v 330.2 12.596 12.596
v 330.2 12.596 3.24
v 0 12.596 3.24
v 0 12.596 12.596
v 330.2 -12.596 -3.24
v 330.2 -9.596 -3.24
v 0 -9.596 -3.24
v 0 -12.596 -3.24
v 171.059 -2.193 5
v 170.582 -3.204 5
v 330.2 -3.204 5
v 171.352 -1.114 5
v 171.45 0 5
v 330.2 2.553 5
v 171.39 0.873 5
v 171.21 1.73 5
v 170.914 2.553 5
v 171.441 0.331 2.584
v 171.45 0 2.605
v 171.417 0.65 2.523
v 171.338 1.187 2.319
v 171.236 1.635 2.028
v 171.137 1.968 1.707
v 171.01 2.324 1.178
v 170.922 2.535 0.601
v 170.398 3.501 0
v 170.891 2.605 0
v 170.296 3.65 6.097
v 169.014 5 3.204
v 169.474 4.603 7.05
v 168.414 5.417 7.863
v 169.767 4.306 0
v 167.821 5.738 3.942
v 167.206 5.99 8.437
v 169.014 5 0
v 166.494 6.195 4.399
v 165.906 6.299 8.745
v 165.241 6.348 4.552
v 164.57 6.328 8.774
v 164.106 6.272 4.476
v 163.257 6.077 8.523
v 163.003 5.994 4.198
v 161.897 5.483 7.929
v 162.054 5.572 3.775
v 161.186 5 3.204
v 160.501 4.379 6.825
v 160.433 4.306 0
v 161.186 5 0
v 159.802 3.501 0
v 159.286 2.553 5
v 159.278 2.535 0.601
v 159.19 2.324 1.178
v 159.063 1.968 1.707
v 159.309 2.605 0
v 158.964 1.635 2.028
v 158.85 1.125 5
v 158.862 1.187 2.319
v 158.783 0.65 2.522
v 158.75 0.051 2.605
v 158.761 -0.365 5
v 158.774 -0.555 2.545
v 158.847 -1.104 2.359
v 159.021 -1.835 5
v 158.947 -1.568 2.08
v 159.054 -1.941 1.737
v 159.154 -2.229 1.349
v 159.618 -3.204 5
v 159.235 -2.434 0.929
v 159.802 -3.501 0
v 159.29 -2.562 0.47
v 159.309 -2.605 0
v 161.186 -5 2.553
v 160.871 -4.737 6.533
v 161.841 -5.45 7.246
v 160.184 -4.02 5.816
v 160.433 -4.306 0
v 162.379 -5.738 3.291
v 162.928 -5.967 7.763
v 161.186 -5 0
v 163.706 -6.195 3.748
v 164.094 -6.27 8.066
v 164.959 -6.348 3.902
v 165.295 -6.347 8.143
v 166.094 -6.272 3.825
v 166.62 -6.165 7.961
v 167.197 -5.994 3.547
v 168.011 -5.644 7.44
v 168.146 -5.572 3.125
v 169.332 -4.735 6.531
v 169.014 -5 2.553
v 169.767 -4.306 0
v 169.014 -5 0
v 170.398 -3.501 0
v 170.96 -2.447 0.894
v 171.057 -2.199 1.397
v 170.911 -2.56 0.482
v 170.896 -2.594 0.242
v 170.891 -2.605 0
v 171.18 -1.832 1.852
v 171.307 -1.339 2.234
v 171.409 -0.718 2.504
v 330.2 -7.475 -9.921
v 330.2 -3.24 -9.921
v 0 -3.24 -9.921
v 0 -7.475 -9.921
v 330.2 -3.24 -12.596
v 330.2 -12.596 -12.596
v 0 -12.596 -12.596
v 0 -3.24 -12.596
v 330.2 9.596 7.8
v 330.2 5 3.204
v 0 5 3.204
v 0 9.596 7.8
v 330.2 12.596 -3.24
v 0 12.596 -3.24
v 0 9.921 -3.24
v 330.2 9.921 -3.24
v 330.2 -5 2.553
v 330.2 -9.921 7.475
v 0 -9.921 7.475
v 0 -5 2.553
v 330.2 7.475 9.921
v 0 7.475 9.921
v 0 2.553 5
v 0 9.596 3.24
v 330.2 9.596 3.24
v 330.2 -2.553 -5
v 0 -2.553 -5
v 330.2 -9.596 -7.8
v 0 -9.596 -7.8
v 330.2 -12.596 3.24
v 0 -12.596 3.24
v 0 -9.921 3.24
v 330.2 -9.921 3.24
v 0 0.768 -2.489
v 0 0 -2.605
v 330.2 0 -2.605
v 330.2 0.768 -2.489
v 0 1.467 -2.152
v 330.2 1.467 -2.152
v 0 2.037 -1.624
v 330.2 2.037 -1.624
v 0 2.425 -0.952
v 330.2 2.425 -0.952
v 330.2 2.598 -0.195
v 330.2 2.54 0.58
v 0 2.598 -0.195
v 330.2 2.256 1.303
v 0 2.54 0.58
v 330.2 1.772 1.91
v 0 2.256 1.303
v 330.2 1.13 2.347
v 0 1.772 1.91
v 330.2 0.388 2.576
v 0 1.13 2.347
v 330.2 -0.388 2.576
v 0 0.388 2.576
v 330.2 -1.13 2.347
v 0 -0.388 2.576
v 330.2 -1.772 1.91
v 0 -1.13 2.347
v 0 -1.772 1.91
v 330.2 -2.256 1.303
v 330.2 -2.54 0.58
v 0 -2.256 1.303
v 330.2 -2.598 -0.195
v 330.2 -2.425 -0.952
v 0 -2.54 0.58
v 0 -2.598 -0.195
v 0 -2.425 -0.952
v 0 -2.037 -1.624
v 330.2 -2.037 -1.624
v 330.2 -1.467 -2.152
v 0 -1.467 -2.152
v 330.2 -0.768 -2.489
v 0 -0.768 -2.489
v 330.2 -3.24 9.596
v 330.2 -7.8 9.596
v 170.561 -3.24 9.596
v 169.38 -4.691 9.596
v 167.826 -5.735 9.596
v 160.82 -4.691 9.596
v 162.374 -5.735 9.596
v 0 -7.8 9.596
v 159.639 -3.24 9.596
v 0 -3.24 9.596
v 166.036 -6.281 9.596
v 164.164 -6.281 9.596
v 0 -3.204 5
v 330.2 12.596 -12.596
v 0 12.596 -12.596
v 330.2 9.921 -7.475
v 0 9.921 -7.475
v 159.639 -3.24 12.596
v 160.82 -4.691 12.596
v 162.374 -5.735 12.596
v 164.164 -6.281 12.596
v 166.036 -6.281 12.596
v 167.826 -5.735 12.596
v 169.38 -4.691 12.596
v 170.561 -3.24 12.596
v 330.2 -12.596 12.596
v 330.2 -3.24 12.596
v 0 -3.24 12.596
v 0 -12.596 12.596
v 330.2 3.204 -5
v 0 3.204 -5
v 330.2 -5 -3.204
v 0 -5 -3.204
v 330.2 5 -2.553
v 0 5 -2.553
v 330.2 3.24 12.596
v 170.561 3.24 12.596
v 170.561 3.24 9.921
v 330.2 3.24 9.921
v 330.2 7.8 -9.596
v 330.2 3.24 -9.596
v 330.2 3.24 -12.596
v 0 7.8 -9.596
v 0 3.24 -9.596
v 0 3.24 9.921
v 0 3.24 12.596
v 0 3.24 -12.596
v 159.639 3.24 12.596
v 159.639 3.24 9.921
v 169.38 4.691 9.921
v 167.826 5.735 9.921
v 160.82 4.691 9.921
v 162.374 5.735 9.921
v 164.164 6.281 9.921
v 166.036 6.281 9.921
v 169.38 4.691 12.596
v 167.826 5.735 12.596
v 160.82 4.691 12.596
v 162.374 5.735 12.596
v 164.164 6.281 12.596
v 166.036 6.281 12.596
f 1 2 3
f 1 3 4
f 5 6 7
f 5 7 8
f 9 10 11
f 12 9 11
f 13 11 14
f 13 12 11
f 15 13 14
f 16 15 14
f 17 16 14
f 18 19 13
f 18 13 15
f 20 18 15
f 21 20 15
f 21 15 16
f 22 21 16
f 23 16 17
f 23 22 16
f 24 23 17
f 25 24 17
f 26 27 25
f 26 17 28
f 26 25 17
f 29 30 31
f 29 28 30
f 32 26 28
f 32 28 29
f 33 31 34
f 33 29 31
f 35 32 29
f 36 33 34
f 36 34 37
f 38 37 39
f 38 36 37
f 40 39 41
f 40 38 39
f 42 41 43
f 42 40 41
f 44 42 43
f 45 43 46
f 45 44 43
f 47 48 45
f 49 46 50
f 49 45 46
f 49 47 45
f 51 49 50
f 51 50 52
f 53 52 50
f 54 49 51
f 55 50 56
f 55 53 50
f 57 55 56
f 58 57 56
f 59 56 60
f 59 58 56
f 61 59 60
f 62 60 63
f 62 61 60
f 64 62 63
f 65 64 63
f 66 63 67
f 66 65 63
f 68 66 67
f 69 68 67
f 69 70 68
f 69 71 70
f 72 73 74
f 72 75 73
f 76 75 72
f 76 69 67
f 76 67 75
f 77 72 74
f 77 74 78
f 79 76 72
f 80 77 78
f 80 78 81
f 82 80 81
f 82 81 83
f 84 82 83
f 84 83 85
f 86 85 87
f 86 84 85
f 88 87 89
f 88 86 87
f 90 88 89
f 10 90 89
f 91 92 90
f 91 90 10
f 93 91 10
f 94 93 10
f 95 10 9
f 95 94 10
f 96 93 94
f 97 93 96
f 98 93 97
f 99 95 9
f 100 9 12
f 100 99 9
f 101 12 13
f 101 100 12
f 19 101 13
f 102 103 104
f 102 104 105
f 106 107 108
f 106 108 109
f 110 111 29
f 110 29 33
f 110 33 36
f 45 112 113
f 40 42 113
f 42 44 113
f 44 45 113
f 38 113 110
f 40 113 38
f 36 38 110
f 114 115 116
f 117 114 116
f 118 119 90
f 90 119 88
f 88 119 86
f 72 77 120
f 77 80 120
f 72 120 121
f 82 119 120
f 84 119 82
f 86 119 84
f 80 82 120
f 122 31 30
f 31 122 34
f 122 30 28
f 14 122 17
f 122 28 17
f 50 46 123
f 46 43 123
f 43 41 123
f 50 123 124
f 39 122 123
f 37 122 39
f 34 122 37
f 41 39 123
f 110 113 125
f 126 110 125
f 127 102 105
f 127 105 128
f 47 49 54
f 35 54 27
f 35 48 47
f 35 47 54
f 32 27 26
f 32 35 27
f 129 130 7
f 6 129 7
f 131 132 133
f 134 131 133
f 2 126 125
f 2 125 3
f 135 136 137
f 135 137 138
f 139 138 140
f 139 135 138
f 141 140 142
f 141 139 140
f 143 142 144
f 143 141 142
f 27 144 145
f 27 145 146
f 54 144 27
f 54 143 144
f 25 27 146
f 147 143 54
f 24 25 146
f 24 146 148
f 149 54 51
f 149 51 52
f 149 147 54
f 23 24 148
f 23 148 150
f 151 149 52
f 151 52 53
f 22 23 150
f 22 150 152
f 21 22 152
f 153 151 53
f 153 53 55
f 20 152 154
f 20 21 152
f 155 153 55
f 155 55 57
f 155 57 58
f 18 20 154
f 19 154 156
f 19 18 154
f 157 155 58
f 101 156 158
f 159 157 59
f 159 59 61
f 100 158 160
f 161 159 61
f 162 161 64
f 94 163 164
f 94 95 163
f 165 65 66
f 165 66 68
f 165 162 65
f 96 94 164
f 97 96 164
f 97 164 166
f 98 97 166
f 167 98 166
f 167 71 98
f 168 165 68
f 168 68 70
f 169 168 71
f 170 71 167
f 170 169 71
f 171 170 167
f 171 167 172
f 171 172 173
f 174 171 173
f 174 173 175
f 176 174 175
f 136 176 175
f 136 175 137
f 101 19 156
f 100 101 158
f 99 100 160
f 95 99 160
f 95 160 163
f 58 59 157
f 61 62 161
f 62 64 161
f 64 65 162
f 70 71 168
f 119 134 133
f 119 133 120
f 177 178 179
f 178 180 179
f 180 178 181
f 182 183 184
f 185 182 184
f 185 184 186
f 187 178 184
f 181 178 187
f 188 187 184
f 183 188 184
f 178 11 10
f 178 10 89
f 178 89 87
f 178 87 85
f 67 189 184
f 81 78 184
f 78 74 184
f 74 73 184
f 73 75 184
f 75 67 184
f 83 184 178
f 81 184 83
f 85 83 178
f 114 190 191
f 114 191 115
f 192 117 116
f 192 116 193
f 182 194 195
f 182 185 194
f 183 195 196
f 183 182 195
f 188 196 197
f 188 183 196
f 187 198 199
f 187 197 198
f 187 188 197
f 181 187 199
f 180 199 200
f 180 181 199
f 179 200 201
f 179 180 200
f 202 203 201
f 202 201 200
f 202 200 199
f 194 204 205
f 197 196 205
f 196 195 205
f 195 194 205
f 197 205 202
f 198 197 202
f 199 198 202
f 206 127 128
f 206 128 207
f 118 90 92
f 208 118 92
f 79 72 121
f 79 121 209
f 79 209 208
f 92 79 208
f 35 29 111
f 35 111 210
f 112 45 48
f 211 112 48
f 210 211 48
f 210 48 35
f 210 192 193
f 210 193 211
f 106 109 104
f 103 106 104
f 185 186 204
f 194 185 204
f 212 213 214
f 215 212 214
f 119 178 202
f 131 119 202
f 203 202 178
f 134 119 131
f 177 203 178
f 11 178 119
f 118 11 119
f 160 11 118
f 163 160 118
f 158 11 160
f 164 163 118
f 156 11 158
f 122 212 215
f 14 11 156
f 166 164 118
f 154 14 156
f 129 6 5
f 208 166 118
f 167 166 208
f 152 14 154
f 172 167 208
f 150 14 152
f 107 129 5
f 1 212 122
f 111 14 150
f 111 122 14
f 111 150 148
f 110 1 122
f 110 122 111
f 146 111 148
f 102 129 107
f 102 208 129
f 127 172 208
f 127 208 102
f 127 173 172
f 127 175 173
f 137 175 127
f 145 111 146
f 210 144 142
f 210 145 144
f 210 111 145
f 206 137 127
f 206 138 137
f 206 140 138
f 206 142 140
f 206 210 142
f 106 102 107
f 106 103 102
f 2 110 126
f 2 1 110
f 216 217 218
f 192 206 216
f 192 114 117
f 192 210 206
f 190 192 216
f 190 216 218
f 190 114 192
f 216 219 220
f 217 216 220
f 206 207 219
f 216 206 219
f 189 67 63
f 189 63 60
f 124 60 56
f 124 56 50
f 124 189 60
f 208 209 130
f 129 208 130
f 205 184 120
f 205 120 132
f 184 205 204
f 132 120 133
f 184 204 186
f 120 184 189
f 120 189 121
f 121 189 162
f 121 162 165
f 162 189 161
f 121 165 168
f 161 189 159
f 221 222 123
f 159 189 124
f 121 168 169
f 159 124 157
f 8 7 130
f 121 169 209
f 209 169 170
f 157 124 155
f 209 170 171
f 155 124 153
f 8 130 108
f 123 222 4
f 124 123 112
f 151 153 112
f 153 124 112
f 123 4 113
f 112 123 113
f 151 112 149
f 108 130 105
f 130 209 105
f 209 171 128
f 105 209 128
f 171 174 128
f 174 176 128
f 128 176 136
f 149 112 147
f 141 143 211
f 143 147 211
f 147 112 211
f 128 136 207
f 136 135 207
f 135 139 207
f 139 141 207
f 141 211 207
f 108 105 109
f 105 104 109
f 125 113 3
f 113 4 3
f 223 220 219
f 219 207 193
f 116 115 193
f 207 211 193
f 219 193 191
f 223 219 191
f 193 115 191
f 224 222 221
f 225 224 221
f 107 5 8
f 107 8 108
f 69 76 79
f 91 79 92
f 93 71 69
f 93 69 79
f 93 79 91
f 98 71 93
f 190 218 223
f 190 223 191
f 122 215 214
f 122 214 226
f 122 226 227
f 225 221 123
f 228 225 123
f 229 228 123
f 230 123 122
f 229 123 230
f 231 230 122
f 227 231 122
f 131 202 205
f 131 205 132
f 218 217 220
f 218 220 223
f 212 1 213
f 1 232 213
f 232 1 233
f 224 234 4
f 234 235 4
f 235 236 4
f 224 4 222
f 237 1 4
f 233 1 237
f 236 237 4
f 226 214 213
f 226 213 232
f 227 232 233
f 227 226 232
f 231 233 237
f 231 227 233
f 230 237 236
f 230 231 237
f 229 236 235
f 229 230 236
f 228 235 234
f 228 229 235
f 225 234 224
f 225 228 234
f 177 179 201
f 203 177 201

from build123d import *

# Parameters (mm, degrees)
SKETCH1_R           = 2.605
BOSS_EXTRUDE1_DEPTH = 330.2
CIRPATTERN1_COUNT   = 4
SKETCH2_R           = 6.35
CUT_EXTRUDE1_DEPTH  = 20


with BuildPart() as part:
    # Sketch1 → Boss-Extrude1 (new body)
    with BuildSketch(Plane(origin=(0, 0, 0), x_dir=(0, 0, -1), z_dir=(1, 0, 0))):
        Polygon((5, -5), (5, 3.203948776), (9.596194078, 7.800142853), (9.596194078, 3.24), (12.596194078, 3.24), (12.596194078, 12.596194078), (3.24, 12.596194078), (3.24, 9.921463197), (7.474873734, 9.921463197), (2.553410537, 5), (-5, 5), (-5, -5), align=None)
        Circle(SKETCH1_R, mode=Mode.SUBTRACT)
    boss_extrude1 = extrude(amount=BOSS_EXTRUDE1_DEPTH)

    # CirPattern1: Boss-Extrude1 ×4 about axis
    cirpattern1_axis = Axis((0, 0, 0), (1, 0, 0))
    for i in range(1, CIRPATTERN1_COUNT):
        add(boss_extrude1.rotate(cirpattern1_axis, i * 360 / CIRPATTERN1_COUNT))

    # Sketch2 → Cut-Extrude1 (cut)
    with BuildSketch(Plane.XY):
        with Locations((165.1, 0)):
            Circle(SKETCH2_R)
    extrude(amount=CUT_EXTRUDE1_DEPTH, mode=Mode.SUBTRACT)


solid = part.part
